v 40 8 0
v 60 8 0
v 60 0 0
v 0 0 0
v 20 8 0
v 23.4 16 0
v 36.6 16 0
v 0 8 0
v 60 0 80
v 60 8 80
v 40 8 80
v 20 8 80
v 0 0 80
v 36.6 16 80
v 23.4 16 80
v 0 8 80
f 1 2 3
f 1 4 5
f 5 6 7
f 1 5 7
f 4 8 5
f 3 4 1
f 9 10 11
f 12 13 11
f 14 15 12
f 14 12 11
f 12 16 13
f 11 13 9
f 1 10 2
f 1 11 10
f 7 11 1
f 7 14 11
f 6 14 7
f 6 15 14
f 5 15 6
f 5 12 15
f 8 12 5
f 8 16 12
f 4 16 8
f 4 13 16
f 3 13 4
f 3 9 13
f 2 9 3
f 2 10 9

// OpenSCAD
$fn = 32;

// ----------------------------------------------------------------------
// V guide rail: dovetail, 60 mm wide
// ----------------------------------------------------------------------

// --- parameters (mm) ---
rail_w = 60;              // rail width, X
base_t = 8;               // base plate thickness
v_depth = 8;              // V feature depth / height
v_half_w = 10;            // half width of the V at the base face
plate_t = 80;             // rail length, Z (the extrusion height)
top_half_w = 6.6;         // half width at the dovetail top
fit_tol = 0.02;           // declared fit tolerance (prompt contract)
free_tol = 0.2;           // declared free tolerance (prompt contract)

dovetail_base = 2 * v_half_w;  // dovetail width at the base
dovetail_top = 2 * top_half_w;  // dovetail width at the top

profile = [[0, 0], [60, 0], [60, 8], [40, 8], [36.6, 16], [23.4, 16], [20, 8], [0, 8]];  // primary outline, 8 points, counter clockwise

// --- the one profile operation ---
linear_extrude(height = plate_t) polygon(points = profile);
